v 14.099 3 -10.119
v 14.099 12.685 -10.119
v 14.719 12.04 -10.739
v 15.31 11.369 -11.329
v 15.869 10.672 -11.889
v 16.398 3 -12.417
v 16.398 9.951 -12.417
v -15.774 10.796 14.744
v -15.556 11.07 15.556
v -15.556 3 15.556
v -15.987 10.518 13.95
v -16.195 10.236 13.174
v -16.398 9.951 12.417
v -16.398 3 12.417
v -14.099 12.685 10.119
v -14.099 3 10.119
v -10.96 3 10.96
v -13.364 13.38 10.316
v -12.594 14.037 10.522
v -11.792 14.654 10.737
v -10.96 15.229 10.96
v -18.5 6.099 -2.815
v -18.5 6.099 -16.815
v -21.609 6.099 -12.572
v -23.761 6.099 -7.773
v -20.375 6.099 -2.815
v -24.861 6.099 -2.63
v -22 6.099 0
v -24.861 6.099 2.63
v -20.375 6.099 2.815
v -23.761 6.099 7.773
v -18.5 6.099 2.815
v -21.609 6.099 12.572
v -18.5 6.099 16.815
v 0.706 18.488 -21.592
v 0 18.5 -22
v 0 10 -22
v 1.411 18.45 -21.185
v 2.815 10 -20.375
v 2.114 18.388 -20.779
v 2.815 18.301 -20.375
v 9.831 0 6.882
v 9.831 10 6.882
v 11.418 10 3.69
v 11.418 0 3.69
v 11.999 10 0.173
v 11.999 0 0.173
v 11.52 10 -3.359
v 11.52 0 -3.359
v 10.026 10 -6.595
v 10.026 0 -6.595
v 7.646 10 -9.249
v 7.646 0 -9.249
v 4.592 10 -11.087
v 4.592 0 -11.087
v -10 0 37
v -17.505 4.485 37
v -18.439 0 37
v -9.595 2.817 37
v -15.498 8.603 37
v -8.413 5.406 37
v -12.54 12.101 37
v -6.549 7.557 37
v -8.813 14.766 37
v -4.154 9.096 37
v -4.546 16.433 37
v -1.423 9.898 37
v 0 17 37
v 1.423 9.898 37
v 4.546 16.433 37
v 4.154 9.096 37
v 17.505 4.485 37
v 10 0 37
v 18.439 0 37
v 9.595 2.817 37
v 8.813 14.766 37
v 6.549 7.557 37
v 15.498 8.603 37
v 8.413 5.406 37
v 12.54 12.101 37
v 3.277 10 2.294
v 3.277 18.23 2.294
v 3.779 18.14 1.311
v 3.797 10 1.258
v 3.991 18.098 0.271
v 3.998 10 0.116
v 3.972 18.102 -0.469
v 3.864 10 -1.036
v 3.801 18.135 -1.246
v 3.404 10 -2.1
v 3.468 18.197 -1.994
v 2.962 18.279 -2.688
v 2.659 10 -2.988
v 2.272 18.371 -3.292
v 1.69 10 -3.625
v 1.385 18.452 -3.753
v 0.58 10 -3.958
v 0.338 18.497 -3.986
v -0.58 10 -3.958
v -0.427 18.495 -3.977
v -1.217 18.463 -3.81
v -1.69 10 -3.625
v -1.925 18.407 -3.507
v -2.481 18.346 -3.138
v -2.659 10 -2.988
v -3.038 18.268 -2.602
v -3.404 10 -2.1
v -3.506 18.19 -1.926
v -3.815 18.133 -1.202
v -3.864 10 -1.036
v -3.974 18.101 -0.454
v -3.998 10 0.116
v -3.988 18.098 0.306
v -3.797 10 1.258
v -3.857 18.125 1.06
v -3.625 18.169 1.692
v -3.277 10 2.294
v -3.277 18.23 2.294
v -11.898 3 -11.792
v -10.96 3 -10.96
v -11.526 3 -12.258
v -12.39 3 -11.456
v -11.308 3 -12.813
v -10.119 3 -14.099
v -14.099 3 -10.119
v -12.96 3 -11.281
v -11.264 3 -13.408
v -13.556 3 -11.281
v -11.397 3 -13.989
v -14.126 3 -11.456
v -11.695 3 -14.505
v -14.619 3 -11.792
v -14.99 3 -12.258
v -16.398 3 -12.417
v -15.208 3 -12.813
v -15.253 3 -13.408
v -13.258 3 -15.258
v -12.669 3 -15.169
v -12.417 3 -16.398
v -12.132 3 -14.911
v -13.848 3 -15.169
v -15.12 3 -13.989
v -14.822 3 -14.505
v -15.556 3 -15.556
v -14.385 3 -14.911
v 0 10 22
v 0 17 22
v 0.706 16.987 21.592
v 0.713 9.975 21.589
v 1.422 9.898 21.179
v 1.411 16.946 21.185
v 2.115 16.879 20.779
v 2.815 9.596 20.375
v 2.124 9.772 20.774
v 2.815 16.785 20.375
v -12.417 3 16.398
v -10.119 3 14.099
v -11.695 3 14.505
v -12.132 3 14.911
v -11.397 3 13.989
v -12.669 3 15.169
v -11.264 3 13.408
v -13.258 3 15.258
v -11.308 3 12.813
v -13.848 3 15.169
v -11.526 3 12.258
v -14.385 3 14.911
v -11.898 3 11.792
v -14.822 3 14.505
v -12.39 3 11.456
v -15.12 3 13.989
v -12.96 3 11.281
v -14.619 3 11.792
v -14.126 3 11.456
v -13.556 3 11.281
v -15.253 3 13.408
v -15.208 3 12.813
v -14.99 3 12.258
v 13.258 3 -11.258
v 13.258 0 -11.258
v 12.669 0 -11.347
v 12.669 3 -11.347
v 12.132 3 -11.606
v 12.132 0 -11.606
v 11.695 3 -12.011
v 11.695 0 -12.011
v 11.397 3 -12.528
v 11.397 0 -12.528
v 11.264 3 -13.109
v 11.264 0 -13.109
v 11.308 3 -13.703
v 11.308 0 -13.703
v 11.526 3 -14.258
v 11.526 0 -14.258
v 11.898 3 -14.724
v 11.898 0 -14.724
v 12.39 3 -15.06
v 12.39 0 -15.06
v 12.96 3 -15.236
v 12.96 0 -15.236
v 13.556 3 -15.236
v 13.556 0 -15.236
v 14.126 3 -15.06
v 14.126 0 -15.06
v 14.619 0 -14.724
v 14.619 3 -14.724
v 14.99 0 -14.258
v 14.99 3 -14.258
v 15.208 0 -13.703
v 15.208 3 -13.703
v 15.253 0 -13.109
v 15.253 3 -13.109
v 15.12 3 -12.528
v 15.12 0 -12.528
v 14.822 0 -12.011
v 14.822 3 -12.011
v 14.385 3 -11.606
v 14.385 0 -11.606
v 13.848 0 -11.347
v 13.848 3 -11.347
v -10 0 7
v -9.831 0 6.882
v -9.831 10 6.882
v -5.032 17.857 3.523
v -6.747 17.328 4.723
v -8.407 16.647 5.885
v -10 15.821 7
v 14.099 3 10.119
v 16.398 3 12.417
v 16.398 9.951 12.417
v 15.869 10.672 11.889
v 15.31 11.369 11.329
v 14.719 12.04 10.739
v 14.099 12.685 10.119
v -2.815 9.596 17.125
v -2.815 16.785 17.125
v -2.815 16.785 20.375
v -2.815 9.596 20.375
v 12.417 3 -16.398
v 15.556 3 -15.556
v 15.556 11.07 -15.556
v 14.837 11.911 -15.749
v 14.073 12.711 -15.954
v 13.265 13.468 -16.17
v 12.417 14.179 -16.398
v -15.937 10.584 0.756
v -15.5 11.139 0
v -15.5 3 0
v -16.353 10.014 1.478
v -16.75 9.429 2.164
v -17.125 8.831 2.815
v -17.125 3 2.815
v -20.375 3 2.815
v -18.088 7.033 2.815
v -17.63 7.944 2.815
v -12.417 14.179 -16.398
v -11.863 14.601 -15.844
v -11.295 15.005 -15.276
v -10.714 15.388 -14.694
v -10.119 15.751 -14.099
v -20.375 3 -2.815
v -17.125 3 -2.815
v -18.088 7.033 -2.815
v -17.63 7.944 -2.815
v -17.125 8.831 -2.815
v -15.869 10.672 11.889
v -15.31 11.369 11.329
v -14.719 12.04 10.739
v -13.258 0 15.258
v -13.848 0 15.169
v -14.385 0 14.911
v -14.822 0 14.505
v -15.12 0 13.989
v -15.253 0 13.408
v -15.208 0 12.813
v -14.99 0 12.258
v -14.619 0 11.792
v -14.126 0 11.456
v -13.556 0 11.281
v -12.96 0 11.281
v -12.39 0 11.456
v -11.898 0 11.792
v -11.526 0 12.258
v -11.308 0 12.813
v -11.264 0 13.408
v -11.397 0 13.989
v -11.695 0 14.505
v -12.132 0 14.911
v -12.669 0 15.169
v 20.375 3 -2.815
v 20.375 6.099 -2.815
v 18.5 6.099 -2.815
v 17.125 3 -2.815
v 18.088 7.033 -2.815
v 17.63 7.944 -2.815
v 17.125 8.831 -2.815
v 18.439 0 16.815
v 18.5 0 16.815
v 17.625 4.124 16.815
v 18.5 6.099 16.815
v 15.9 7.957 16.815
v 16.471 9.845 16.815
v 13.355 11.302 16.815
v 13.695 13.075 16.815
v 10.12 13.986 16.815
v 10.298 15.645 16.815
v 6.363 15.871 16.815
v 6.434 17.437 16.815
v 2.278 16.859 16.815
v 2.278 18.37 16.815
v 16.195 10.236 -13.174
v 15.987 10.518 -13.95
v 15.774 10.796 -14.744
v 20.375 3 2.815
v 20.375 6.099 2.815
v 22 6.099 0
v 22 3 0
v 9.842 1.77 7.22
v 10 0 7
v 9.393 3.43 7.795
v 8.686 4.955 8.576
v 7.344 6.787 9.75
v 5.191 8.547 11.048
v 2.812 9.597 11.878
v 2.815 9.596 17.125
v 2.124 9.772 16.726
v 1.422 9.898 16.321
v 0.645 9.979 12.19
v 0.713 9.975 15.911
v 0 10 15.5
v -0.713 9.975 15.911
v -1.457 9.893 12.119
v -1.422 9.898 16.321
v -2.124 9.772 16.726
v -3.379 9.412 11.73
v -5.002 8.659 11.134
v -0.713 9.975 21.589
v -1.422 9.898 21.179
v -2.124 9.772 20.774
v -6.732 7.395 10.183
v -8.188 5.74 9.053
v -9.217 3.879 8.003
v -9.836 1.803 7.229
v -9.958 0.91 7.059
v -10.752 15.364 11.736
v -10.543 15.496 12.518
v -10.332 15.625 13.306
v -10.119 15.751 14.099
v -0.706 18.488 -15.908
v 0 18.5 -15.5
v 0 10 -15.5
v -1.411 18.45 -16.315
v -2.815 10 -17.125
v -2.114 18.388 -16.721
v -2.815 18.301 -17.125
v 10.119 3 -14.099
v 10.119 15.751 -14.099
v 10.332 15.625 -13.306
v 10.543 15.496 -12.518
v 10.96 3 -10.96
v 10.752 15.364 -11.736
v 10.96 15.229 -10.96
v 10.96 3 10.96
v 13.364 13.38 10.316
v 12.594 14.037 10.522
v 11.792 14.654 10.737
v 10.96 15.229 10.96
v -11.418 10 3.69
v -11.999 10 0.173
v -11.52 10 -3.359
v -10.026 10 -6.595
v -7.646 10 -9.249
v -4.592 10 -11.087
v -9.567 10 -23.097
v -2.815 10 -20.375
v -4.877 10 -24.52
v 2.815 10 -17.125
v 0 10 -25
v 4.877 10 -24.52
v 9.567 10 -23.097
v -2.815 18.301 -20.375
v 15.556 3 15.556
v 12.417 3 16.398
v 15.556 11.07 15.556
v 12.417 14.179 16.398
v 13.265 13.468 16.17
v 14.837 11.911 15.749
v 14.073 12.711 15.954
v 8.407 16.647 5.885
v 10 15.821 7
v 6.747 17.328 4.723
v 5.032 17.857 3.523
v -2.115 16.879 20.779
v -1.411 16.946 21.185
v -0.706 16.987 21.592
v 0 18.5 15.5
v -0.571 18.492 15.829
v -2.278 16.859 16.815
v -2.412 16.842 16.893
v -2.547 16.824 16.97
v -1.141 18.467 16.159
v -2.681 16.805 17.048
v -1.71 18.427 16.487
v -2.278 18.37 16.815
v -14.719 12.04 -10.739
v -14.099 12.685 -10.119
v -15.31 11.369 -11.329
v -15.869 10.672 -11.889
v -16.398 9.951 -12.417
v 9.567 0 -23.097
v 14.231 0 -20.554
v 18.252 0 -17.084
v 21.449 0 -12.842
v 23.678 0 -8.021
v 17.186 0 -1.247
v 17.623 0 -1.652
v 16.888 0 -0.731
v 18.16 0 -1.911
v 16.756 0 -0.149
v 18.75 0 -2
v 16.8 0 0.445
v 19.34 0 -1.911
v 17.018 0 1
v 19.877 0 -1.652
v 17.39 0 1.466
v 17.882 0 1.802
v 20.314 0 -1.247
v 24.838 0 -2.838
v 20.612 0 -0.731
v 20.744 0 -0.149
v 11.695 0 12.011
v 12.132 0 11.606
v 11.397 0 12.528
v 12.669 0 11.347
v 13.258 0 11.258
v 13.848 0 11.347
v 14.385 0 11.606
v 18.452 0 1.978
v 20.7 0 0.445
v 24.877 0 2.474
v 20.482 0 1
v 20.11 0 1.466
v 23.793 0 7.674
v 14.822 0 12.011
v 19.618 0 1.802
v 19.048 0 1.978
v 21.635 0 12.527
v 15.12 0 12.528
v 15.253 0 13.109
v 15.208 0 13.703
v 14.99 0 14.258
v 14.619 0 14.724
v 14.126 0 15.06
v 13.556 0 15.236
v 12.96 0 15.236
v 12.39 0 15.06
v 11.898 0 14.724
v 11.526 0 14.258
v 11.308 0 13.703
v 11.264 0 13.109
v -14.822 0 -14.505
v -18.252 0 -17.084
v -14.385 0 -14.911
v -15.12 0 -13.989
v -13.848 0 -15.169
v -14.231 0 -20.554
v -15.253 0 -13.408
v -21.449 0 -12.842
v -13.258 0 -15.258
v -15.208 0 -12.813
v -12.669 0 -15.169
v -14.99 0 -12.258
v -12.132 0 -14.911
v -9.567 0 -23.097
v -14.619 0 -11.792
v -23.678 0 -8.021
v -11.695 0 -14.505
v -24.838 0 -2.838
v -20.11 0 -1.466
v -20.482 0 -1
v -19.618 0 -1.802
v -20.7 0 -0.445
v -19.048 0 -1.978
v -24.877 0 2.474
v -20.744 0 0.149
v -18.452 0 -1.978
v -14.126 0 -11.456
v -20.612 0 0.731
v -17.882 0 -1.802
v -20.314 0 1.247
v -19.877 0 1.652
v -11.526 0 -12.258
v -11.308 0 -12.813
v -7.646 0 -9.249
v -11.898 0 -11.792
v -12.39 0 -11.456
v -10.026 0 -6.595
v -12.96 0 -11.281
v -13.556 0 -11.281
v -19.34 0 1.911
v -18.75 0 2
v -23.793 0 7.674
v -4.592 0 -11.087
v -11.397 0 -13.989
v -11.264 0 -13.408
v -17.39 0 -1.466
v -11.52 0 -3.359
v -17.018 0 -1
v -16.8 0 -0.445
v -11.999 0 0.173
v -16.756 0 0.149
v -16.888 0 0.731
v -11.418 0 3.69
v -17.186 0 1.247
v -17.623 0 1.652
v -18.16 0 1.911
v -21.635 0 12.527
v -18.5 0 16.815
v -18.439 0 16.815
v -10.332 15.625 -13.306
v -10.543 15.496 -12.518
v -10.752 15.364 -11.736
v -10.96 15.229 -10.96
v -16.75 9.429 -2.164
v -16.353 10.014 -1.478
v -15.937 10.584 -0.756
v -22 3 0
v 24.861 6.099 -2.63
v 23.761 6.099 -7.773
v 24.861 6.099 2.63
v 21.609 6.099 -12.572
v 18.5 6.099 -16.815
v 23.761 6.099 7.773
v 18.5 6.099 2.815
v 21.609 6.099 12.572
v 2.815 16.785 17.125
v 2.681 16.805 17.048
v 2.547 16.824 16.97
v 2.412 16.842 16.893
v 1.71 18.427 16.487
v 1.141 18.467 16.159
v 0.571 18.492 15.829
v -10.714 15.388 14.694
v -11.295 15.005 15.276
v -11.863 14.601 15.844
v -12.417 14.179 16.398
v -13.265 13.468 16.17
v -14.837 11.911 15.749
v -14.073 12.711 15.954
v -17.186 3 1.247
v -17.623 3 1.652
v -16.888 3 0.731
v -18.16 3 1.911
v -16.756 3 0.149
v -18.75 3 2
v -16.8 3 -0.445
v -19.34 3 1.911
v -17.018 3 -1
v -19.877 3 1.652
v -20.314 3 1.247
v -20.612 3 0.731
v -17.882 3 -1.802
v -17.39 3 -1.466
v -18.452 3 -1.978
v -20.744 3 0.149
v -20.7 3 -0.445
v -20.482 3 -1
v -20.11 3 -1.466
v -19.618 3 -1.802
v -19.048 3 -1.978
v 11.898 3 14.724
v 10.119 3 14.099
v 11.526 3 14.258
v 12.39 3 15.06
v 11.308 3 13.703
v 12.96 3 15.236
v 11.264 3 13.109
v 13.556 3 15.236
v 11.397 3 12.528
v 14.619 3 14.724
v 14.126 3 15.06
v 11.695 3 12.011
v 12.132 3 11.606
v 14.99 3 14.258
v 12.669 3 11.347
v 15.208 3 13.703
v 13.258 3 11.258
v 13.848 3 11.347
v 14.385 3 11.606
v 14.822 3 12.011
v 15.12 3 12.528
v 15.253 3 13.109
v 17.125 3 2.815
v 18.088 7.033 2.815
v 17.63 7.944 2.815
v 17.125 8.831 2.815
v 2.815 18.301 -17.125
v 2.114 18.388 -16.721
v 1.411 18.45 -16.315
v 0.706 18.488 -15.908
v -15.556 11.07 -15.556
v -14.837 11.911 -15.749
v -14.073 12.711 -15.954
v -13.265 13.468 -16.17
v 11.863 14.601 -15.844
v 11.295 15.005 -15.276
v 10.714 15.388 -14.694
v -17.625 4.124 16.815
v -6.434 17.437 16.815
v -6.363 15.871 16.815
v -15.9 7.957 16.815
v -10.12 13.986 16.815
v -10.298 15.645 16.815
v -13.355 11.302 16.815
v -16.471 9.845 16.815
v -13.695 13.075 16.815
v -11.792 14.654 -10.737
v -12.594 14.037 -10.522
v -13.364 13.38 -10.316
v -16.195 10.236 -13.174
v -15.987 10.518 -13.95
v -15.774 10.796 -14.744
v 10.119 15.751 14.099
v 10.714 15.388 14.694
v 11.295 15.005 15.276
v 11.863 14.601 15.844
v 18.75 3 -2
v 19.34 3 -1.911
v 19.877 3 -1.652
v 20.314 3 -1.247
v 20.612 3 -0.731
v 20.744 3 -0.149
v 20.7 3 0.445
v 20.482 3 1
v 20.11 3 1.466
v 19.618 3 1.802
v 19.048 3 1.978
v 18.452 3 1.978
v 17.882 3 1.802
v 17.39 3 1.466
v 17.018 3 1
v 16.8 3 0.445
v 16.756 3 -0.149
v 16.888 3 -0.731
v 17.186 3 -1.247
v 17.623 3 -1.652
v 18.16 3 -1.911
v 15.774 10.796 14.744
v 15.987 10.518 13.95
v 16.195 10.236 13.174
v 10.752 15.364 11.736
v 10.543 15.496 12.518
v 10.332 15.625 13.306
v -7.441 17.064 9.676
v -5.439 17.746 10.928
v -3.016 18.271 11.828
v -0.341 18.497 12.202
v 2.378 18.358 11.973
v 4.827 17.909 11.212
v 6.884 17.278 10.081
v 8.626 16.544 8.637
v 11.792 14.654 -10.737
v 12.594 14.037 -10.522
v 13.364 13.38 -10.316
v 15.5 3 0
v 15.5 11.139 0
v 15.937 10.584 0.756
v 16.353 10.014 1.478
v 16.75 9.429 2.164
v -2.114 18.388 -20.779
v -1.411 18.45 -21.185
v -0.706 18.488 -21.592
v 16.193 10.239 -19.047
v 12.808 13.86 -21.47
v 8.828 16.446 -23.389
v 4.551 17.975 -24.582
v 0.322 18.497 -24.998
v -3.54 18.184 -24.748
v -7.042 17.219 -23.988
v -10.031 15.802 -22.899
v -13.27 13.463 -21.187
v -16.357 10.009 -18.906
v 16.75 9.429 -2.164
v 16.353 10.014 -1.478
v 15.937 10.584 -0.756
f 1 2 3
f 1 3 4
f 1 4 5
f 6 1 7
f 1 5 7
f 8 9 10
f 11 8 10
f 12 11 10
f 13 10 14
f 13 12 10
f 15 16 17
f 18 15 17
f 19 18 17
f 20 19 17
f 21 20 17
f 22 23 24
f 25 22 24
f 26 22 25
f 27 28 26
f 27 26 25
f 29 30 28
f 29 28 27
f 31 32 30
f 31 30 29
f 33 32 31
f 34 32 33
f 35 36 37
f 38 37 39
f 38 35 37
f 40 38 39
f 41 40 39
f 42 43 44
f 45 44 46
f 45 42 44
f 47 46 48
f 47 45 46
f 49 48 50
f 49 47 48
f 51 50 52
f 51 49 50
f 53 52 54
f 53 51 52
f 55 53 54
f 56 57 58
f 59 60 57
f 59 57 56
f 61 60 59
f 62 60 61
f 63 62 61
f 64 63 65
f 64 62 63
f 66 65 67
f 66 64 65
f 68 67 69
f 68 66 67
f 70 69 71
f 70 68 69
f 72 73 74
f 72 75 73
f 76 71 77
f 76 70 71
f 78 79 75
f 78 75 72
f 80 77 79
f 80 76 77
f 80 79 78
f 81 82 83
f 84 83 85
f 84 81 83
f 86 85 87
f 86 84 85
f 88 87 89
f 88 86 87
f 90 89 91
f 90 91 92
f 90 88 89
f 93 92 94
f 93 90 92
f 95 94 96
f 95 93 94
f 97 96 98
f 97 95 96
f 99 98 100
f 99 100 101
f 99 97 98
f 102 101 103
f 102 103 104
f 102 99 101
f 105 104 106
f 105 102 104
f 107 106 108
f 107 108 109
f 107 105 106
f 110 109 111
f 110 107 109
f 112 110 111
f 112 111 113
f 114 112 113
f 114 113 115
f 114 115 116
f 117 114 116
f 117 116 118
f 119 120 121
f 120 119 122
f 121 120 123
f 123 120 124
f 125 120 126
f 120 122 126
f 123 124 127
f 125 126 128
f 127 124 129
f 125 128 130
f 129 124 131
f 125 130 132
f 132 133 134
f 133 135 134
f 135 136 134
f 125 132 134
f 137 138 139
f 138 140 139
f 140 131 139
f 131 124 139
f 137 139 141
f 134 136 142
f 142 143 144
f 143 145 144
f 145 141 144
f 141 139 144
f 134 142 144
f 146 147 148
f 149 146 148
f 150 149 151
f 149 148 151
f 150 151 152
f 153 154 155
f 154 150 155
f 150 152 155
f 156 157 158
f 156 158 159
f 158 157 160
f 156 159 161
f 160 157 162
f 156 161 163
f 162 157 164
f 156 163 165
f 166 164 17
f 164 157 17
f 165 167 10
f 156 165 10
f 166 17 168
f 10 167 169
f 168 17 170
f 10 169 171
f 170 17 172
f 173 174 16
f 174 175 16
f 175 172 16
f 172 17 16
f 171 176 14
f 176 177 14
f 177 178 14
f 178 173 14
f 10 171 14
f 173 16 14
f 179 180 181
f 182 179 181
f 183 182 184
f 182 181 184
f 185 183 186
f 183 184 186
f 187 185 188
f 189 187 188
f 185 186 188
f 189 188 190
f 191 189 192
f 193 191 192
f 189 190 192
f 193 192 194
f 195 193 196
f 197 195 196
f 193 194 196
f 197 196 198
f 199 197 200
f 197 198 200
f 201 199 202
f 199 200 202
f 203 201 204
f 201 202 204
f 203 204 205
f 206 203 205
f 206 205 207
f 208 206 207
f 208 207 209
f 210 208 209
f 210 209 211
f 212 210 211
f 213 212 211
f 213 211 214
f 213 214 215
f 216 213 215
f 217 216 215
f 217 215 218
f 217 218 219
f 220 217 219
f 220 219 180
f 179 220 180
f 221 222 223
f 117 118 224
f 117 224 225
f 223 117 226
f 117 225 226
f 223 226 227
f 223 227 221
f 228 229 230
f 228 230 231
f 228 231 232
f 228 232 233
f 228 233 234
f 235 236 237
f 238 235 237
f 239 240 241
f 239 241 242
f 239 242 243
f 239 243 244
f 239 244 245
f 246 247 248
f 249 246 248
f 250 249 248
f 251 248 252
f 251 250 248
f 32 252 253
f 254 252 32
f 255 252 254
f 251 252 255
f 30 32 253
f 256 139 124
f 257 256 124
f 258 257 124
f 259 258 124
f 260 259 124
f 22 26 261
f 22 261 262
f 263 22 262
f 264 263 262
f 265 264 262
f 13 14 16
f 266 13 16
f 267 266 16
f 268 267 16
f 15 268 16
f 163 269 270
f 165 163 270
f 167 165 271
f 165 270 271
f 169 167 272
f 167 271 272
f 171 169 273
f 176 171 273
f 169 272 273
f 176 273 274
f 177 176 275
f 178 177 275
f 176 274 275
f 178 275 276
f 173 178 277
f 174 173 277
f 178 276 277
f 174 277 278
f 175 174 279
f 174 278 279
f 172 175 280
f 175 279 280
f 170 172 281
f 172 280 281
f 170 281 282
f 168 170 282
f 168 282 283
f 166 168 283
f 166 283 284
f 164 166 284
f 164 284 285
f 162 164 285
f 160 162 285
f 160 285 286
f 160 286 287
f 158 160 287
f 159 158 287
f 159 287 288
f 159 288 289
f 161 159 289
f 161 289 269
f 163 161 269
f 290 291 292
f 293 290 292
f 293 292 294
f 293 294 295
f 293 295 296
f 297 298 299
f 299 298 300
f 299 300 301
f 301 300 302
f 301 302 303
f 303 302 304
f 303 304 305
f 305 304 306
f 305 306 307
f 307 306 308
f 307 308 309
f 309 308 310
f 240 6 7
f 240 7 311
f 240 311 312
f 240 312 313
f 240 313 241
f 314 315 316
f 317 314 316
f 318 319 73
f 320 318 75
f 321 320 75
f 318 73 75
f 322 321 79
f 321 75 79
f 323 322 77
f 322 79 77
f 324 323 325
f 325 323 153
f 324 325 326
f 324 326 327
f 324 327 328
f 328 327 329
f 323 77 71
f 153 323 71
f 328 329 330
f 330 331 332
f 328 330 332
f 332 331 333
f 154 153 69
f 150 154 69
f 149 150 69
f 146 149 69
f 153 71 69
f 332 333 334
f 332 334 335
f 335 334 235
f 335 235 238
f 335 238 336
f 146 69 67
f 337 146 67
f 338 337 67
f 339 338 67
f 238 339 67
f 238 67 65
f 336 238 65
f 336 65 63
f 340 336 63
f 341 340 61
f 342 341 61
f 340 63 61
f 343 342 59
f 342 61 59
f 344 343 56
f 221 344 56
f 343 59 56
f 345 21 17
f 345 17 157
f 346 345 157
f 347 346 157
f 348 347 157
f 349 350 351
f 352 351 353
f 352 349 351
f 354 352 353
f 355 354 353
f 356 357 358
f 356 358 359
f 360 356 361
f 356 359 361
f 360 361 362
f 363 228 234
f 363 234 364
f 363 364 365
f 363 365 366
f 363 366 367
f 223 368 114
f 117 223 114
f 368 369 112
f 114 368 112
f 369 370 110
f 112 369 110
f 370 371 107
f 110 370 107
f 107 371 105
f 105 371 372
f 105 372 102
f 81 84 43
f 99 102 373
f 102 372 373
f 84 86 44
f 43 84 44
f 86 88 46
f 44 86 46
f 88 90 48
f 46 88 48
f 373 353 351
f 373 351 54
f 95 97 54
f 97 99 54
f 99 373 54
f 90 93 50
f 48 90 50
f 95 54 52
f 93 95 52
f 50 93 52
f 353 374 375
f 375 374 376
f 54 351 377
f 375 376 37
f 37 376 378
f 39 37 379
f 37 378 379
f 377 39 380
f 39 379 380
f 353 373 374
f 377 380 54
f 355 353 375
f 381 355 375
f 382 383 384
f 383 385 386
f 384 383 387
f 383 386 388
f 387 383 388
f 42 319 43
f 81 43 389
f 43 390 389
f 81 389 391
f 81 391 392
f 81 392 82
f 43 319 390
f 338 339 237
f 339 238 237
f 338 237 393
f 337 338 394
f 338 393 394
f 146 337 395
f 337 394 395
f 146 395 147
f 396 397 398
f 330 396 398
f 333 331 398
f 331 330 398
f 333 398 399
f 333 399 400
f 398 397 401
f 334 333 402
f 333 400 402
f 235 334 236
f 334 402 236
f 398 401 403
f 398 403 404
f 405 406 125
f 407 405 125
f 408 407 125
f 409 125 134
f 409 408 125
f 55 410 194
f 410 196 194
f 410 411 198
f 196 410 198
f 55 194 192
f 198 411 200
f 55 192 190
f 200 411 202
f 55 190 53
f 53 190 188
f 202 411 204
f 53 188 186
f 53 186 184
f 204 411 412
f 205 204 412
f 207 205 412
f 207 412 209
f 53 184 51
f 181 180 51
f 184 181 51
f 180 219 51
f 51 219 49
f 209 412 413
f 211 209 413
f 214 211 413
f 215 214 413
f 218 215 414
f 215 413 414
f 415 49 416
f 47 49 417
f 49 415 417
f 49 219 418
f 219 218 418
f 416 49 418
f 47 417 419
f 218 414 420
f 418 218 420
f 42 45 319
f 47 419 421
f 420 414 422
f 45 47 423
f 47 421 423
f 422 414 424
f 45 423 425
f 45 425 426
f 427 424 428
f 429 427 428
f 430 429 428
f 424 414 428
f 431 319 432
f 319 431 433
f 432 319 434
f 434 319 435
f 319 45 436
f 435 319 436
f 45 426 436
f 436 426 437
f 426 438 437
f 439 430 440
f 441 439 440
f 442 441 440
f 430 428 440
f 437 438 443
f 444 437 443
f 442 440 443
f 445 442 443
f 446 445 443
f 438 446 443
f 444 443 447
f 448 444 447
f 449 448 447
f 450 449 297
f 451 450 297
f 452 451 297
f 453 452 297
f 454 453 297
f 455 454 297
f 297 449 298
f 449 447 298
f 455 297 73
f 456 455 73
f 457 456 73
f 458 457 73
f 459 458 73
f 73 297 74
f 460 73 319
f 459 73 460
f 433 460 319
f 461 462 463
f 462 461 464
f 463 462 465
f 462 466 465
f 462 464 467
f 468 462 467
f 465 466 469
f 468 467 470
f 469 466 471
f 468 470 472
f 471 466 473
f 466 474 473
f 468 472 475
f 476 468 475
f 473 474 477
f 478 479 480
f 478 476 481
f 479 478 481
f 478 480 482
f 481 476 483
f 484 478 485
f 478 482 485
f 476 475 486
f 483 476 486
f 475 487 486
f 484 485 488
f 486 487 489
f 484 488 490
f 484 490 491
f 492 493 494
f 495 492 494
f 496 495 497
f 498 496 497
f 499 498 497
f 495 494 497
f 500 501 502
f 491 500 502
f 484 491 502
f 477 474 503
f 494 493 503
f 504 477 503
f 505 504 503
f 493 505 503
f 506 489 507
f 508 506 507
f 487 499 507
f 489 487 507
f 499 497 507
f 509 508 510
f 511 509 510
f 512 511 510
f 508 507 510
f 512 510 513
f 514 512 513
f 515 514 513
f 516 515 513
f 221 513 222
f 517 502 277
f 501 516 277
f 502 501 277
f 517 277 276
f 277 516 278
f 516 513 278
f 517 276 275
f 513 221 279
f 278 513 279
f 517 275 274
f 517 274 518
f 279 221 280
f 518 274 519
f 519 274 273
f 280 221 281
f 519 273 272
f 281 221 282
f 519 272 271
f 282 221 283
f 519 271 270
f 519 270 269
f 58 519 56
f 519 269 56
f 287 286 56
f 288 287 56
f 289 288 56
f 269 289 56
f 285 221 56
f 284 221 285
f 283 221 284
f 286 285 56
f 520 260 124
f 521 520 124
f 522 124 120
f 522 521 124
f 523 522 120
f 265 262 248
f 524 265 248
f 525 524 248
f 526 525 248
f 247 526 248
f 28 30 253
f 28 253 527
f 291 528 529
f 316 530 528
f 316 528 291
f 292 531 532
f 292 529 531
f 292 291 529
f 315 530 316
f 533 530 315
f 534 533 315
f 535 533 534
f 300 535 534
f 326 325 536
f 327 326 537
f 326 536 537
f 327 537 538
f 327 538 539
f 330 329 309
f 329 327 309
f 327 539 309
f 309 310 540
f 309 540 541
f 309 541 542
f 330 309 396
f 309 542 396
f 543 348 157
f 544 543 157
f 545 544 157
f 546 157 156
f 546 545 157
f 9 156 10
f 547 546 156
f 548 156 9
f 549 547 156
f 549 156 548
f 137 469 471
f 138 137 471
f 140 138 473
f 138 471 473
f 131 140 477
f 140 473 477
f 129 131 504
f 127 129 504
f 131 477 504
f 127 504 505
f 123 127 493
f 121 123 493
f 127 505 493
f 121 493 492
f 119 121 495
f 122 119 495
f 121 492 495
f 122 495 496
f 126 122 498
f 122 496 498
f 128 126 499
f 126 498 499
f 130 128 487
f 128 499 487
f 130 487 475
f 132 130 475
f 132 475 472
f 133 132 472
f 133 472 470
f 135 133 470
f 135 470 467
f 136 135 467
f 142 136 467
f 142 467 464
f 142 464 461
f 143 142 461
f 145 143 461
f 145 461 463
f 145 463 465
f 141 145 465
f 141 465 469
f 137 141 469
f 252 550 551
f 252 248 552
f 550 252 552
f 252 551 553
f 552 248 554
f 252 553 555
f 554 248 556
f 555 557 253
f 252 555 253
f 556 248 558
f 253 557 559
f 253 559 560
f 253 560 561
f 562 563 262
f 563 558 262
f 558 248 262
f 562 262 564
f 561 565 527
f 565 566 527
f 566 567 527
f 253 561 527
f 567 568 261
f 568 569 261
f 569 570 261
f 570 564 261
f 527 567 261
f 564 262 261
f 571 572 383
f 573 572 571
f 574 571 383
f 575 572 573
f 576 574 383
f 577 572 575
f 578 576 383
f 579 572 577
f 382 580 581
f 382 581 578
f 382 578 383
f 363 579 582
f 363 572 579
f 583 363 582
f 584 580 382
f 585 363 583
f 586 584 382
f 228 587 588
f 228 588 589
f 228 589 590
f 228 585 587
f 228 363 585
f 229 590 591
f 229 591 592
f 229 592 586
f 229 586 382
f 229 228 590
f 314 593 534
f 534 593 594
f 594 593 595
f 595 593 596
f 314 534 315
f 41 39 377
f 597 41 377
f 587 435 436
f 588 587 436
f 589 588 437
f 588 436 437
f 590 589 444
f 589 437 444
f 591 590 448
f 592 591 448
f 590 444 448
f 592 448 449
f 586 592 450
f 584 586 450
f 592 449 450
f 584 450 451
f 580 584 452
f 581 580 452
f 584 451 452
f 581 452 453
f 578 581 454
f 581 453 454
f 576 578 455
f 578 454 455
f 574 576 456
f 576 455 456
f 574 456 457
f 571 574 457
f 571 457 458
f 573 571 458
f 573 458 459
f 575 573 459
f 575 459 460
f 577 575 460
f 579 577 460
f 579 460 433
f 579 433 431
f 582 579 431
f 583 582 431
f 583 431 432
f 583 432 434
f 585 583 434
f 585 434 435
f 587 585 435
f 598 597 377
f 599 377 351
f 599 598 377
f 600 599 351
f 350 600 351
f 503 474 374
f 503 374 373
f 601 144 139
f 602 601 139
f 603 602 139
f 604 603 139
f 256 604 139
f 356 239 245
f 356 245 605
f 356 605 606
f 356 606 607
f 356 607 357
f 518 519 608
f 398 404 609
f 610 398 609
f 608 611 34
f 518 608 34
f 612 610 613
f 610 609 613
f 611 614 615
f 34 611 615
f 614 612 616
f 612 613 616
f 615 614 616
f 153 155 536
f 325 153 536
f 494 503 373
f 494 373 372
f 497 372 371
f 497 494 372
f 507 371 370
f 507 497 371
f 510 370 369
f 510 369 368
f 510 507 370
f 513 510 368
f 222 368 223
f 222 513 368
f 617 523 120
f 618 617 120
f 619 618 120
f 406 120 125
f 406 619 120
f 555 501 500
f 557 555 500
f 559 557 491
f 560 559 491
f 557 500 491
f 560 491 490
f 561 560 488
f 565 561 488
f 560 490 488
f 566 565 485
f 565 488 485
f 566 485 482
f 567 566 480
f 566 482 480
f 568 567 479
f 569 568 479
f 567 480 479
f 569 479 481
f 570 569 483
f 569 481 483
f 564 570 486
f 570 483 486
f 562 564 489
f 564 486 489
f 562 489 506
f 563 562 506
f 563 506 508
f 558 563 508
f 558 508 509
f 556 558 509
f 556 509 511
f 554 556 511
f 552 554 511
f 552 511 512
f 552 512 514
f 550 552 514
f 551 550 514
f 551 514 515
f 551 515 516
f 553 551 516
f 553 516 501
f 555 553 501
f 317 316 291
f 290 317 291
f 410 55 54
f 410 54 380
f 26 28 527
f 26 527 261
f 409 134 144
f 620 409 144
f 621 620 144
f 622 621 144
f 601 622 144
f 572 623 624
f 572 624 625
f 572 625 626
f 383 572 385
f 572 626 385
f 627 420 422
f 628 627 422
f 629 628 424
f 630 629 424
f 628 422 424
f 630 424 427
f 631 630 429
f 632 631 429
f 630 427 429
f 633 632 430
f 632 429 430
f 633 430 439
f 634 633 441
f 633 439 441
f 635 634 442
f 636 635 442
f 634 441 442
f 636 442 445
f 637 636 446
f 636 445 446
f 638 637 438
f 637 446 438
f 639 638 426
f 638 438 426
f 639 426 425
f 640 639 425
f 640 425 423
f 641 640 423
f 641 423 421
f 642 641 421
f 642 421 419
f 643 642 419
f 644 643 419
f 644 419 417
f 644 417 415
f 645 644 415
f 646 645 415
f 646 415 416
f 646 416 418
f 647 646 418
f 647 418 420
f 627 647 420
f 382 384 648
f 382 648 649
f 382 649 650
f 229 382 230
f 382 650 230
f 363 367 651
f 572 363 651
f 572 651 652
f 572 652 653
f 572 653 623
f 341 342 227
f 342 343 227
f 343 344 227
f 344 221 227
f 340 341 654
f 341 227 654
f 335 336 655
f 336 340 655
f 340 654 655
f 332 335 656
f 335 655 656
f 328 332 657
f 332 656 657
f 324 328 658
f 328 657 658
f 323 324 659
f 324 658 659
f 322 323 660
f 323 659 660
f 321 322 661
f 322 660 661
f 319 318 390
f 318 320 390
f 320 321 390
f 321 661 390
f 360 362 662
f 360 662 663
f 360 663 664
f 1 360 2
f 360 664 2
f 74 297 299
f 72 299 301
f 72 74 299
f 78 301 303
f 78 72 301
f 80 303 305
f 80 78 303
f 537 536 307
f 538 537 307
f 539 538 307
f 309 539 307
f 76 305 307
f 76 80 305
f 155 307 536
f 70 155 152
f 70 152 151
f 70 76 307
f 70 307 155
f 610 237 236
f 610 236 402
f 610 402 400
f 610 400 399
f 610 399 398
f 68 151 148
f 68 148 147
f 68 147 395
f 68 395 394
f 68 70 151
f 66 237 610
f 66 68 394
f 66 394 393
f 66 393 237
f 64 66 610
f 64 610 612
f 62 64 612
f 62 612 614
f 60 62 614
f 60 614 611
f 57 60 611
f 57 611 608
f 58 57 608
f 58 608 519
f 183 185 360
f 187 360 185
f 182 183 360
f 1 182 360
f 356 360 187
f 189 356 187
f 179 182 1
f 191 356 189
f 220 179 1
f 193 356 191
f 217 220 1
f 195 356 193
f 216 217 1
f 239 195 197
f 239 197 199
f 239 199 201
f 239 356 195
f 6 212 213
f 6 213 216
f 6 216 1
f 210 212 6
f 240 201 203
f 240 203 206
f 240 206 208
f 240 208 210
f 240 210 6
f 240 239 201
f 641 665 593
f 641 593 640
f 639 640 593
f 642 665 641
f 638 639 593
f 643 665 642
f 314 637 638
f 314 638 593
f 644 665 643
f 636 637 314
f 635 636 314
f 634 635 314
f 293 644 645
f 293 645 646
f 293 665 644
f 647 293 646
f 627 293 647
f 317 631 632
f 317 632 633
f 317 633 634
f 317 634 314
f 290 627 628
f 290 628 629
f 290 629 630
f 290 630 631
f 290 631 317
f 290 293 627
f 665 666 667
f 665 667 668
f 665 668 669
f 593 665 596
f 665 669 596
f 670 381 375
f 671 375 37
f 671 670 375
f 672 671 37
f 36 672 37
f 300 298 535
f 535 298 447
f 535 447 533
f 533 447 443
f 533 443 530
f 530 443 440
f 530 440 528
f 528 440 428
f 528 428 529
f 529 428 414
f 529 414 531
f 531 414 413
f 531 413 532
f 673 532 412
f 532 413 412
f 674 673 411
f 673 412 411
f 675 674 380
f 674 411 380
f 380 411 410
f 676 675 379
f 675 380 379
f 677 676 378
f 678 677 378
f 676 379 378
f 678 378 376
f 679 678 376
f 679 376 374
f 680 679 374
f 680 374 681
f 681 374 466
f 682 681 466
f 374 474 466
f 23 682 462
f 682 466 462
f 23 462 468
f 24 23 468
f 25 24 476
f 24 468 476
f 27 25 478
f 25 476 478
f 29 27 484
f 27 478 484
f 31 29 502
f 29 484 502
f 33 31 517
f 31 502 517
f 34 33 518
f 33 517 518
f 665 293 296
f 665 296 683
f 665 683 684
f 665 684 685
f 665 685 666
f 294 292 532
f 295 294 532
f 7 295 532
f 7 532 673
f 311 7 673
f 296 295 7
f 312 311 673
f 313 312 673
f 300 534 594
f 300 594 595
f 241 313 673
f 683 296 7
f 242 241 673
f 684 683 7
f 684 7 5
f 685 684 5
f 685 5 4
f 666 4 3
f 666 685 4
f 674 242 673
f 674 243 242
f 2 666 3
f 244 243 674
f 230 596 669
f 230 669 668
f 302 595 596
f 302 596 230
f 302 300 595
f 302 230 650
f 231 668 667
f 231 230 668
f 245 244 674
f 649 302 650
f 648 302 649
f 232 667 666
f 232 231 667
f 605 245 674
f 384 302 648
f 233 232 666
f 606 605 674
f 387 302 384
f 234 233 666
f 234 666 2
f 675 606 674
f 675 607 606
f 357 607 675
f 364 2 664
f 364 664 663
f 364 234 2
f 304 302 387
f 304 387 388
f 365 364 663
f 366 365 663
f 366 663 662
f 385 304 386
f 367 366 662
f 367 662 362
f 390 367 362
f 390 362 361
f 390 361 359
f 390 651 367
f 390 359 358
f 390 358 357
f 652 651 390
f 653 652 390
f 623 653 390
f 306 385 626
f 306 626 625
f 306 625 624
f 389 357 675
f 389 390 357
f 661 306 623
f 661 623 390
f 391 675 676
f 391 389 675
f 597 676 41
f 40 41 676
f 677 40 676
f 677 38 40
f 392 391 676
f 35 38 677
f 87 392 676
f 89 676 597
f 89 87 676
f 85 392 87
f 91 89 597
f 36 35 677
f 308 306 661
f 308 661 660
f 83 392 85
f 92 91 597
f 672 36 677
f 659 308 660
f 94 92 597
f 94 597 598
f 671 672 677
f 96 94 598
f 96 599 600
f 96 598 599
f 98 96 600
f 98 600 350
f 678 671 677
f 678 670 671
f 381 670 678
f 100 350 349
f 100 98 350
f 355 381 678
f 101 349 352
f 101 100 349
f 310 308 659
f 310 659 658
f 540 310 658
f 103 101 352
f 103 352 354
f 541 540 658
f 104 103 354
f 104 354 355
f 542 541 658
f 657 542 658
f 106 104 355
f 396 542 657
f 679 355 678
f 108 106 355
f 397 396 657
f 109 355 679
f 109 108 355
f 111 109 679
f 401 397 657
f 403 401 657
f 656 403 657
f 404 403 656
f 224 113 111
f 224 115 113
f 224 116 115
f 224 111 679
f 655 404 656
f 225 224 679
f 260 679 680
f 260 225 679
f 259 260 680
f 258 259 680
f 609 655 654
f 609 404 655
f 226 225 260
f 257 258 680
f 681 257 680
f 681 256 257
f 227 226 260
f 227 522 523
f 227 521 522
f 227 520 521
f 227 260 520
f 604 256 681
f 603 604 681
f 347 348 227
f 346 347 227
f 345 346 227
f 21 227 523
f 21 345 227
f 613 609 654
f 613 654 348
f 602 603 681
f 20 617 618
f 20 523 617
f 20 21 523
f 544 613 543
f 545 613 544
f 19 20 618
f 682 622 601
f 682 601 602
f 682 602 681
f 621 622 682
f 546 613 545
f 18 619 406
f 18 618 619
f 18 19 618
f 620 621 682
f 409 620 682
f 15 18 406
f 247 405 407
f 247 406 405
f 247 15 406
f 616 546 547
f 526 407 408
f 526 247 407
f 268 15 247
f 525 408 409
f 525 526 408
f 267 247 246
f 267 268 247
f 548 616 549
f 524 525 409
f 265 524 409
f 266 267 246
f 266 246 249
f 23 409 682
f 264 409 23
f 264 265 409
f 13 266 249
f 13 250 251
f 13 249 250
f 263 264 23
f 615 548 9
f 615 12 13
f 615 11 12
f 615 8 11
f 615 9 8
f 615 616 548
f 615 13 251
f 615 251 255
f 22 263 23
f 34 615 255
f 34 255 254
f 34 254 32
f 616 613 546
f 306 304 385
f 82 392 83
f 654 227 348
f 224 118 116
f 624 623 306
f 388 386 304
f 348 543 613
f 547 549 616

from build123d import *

# Parameters (mm, degrees)
SKETCH_1_R               = 25
SKETCH_1_R_2             = 12
EXTRUDE_1_DEPTH          = 10
SKETCH_2_R               = 25
SKETCH_2_R_2             = 4
EXTRUDE_2_DEPTH          = 10
SKETCH_5_W               = 37
SKETCH_5_H               = 20
EXTRUDE_3_DEPTH          = 25
CUT_EXTRUDE_1_DEPTH      = 20.184828
SKETCH_8_R               = 2
CUT_EXTRUDE_2_DEPTH      = 49.928519291
CUT_EXTRUDE_4_DEPTH      = 10
CUT_EXTRUDE_5_DEPTH      = 70.778220126
CUT_EXTRUDE_6_DEPTH      = 15.5
SKETCH_12_R              = 10
CUT_EXTRUDE_7_DEPTH      = 30
CUT_EXTRUDE_8_DEPTH      = 46.760244912
CUT_EXTRUDE_8_DEPTH_BACK = 46.760244912


with BuildPart() as part:
    # 草图1 → 凸台-拉伸1 (new body)
    with BuildSketch(Plane(origin=(0, 0, 0), x_dir=(1, 0, 0), z_dir=(0, 1, 0))):
        with Locations(Location((0, 0, 0), (0, 0, 270))):
            Circle(SKETCH_1_R)
        with Locations(Location((0, 0, 0), (0, 0, 270))):
            Circle(SKETCH_1_R_2, mode=Mode.SUBTRACT)
    extrude(amount=EXTRUDE_1_DEPTH)

    # 草图2 → 凸台-拉伸2 (add)
    with BuildSketch(Plane(origin=(0, 10, 0), x_dir=(1, 0, 0), z_dir=(0, 1, 0))):
        with Locations(Location((0, 0, 0), (0, 0, 270))):
            Circle(SKETCH_2_R)
        with Locations(Location((0, 0, 0), (0, 0, 270))):
            Circle(SKETCH_2_R_2, mode=Mode.SUBTRACT)
    extrude(amount=EXTRUDE_2_DEPTH)

    # 草图5 → 凸台-拉伸3 (add)
    with BuildSketch(Plane.XY.offset(12)):
        with Locations((0, 10)):
            Rectangle(SKETCH_5_W, SKETCH_5_H)
    extrude(amount=EXTRUDE_3_DEPTH)

    # 草图6 → 切除-拉伸1 (cut)
    with BuildSketch(Plane.XY.offset(37)):
        with BuildLine():
            Line((-18.490572983, -0.909482628), (-28.986413715, -0.909482628))
            Line((-28.986413715, -0.909482628), (-28.986413715, 31.85575571))
            Line((-28.986413715, 31.85575571), (34.685567791, 31.85575571))
            Line((34.685567791, 31.85575571), (34.685567791, -1.610938363))
            Line((34.685567791, -1.610938363), (18.499667367, -1.610938363))
            ThreePointArc((18.499667367, -1.610938363), (0.350757344, 16.996674547), (-18.490572983, -0.909482628))
        make_face()
    extrude(amount=-CUT_EXTRUDE_1_DEPTH, mode=Mode.SUBTRACT)

    # 草图8 → 切除-拉伸2 (cut, through all)
    with BuildSketch(Plane.XZ):
        with Locations(Location((18.75, 0, 0), (0, 0, 270))):
            Circle(SKETCH_8_R)
        with Locations(Location((13.258252147, 13.258252147, 0), (0, 0, 270))):
            Circle(SKETCH_8_R)
        with Locations(Location((0, 18.75, 0), (0, 0, 284.666911028))):
            Circle(SKETCH_8_R)
        with Locations(Location((-18.75, 0, 0), (0, 0, 90))):
            Circle(SKETCH_8_R)
        with Locations(Location((-13.258252147, 13.258252147, 0), (0, 0, 90))):
            Circle(SKETCH_8_R)
        with Locations(Location((13.258252147, -13.258252147, 0), (0, 0, 90))):
            Circle(SKETCH_8_R)
        with Locations(Location((0, -18.75, 0), (0, 0, 270))):
            Circle(SKETCH_8_R)
        with Locations(Location((-13.258252147, -13.258252147, 0), (0, 0, 270))):
            Circle(SKETCH_8_R)
    extrude(amount=-CUT_EXTRUDE_2_DEPTH, mode=Mode.SUBTRACT)

    # 草图9 → 切除-拉伸4 (cut)
    with BuildSketch(Plane(origin=(0, 0, 0), x_dir=(1, 0, 0), z_dir=(0, 1, 0))):
        Polygon((0, 0), (10.593685304, 25.575418736), (-10.593685304, 25.575418736), align=None)
    extrude(amount=CUT_EXTRUDE_4_DEPTH, mode=Mode.SUBTRACT)

    # 草图10 → 切除-拉伸5 (cut, through all)
    with BuildSketch(Plane.XY.offset(37)):
        with BuildLine():
            Line((-18.5, 6.099342077), (-25, 6.099342077))
            Line((-25, 6.099342077), (-25, 20))
            Line((-25, 20), (25, 20))
            Line((25, 20), (25, 6.099342077))
            Line((25, 6.099342077), (18.5, 6.099342077))
            ThreePointArc((18.5, 6.099342077), (0, 18.5), (-18.5, 6.099342077))
        make_face()
    extrude(amount=-CUT_EXTRUDE_5_DEPTH, mode=Mode.SUBTRACT)

    # 草图11 → 切除-拉伸6 (cut)
    with BuildSketch(Plane(origin=(0, 18.5, 0), x_dir=(1, 0, 0), z_dir=(0, 1, 0))):
        Polygon((0, -15.5), (-2.814582562, -17.125), (-2.814582562, -20.375), (0, -22), (2.814582562, -20.375), (2.814582562, -17.125), align=None)
        Polygon((-14.099414044, -10.118993212), (-10.960155108, -10.960155108), (-10.118993212, -14.099414044), (-12.417090251, -16.397511083), (-15.556349186, -15.556349186), (-16.397511083, -12.417090251), align=None)
        Polygon((10.960155108, -10.960155108), (10.118993212, -14.099414044), (12.417090251, -16.397511083), (15.556349186, -15.556349186), (16.397511083, -12.417090251), (14.099414044, -10.118993212), align=None)
        Polygon((-10.118993212, 14.099414044), (-10.960155108, 10.960155108), (-14.099414044, 10.118993212), (-16.397511083, 12.417090251), (-15.556349186, 15.556349186), (-12.417090251, 16.397511083), align=None)
        Polygon((-17.125, 2.814582562), (-15.5, 0), (-17.125, -2.814582562), (-20.375, -2.814582562), (-22, 0), (-20.375, 2.814582562), align=None)
        Polygon((10.960155108, 10.960155108), (14.099414044, 10.118993212), (16.397511083, 12.417090251), (15.556349186, 15.556349186), (12.417090251, 16.397511083), (10.118993212, 14.099414044), align=None)
        Polygon((15.5, 0), (17.125, -2.814582562), (20.375, -2.814582562), (22, 0), (20.375, 2.814582562), (17.125, 2.814582562), align=None)
        Polygon((2.814582562, 17.125), (0, 15.5), (-2.814582562, 17.125), (-2.814582562, 20.375), (0, 22), (2.814582562, 20.375), align=None)
    extrude(amount=-CUT_EXTRUDE_6_DEPTH, mode=Mode.SUBTRACT)

    # 草图12 → 切除-拉伸7 (cut)
    with BuildSketch(Plane.XY.offset(37)):
        Circle(SKETCH_12_R)
    extrude(amount=-CUT_EXTRUDE_7_DEPTH, mode=Mode.SUBTRACT)

    # 草图13 → 切除-拉伸8 (cut, two sides: drawn at the far end of the back side and taken through both)
    with BuildSketch(Plane.XZ.offset(-10).offset(-CUT_EXTRUDE_8_DEPTH_BACK)):
        with BuildLine():
            Line((0, 0), (-10, 7))
            ThreePointArc((-10, 7), (0, 12.206555616), (10, 7))
            Line((10, 7), (0, 0))
        make_face()
    extrude(amount=CUT_EXTRUDE_8_DEPTH + CUT_EXTRUDE_8_DEPTH_BACK, mode=Mode.SUBTRACT)


solid = part.part
